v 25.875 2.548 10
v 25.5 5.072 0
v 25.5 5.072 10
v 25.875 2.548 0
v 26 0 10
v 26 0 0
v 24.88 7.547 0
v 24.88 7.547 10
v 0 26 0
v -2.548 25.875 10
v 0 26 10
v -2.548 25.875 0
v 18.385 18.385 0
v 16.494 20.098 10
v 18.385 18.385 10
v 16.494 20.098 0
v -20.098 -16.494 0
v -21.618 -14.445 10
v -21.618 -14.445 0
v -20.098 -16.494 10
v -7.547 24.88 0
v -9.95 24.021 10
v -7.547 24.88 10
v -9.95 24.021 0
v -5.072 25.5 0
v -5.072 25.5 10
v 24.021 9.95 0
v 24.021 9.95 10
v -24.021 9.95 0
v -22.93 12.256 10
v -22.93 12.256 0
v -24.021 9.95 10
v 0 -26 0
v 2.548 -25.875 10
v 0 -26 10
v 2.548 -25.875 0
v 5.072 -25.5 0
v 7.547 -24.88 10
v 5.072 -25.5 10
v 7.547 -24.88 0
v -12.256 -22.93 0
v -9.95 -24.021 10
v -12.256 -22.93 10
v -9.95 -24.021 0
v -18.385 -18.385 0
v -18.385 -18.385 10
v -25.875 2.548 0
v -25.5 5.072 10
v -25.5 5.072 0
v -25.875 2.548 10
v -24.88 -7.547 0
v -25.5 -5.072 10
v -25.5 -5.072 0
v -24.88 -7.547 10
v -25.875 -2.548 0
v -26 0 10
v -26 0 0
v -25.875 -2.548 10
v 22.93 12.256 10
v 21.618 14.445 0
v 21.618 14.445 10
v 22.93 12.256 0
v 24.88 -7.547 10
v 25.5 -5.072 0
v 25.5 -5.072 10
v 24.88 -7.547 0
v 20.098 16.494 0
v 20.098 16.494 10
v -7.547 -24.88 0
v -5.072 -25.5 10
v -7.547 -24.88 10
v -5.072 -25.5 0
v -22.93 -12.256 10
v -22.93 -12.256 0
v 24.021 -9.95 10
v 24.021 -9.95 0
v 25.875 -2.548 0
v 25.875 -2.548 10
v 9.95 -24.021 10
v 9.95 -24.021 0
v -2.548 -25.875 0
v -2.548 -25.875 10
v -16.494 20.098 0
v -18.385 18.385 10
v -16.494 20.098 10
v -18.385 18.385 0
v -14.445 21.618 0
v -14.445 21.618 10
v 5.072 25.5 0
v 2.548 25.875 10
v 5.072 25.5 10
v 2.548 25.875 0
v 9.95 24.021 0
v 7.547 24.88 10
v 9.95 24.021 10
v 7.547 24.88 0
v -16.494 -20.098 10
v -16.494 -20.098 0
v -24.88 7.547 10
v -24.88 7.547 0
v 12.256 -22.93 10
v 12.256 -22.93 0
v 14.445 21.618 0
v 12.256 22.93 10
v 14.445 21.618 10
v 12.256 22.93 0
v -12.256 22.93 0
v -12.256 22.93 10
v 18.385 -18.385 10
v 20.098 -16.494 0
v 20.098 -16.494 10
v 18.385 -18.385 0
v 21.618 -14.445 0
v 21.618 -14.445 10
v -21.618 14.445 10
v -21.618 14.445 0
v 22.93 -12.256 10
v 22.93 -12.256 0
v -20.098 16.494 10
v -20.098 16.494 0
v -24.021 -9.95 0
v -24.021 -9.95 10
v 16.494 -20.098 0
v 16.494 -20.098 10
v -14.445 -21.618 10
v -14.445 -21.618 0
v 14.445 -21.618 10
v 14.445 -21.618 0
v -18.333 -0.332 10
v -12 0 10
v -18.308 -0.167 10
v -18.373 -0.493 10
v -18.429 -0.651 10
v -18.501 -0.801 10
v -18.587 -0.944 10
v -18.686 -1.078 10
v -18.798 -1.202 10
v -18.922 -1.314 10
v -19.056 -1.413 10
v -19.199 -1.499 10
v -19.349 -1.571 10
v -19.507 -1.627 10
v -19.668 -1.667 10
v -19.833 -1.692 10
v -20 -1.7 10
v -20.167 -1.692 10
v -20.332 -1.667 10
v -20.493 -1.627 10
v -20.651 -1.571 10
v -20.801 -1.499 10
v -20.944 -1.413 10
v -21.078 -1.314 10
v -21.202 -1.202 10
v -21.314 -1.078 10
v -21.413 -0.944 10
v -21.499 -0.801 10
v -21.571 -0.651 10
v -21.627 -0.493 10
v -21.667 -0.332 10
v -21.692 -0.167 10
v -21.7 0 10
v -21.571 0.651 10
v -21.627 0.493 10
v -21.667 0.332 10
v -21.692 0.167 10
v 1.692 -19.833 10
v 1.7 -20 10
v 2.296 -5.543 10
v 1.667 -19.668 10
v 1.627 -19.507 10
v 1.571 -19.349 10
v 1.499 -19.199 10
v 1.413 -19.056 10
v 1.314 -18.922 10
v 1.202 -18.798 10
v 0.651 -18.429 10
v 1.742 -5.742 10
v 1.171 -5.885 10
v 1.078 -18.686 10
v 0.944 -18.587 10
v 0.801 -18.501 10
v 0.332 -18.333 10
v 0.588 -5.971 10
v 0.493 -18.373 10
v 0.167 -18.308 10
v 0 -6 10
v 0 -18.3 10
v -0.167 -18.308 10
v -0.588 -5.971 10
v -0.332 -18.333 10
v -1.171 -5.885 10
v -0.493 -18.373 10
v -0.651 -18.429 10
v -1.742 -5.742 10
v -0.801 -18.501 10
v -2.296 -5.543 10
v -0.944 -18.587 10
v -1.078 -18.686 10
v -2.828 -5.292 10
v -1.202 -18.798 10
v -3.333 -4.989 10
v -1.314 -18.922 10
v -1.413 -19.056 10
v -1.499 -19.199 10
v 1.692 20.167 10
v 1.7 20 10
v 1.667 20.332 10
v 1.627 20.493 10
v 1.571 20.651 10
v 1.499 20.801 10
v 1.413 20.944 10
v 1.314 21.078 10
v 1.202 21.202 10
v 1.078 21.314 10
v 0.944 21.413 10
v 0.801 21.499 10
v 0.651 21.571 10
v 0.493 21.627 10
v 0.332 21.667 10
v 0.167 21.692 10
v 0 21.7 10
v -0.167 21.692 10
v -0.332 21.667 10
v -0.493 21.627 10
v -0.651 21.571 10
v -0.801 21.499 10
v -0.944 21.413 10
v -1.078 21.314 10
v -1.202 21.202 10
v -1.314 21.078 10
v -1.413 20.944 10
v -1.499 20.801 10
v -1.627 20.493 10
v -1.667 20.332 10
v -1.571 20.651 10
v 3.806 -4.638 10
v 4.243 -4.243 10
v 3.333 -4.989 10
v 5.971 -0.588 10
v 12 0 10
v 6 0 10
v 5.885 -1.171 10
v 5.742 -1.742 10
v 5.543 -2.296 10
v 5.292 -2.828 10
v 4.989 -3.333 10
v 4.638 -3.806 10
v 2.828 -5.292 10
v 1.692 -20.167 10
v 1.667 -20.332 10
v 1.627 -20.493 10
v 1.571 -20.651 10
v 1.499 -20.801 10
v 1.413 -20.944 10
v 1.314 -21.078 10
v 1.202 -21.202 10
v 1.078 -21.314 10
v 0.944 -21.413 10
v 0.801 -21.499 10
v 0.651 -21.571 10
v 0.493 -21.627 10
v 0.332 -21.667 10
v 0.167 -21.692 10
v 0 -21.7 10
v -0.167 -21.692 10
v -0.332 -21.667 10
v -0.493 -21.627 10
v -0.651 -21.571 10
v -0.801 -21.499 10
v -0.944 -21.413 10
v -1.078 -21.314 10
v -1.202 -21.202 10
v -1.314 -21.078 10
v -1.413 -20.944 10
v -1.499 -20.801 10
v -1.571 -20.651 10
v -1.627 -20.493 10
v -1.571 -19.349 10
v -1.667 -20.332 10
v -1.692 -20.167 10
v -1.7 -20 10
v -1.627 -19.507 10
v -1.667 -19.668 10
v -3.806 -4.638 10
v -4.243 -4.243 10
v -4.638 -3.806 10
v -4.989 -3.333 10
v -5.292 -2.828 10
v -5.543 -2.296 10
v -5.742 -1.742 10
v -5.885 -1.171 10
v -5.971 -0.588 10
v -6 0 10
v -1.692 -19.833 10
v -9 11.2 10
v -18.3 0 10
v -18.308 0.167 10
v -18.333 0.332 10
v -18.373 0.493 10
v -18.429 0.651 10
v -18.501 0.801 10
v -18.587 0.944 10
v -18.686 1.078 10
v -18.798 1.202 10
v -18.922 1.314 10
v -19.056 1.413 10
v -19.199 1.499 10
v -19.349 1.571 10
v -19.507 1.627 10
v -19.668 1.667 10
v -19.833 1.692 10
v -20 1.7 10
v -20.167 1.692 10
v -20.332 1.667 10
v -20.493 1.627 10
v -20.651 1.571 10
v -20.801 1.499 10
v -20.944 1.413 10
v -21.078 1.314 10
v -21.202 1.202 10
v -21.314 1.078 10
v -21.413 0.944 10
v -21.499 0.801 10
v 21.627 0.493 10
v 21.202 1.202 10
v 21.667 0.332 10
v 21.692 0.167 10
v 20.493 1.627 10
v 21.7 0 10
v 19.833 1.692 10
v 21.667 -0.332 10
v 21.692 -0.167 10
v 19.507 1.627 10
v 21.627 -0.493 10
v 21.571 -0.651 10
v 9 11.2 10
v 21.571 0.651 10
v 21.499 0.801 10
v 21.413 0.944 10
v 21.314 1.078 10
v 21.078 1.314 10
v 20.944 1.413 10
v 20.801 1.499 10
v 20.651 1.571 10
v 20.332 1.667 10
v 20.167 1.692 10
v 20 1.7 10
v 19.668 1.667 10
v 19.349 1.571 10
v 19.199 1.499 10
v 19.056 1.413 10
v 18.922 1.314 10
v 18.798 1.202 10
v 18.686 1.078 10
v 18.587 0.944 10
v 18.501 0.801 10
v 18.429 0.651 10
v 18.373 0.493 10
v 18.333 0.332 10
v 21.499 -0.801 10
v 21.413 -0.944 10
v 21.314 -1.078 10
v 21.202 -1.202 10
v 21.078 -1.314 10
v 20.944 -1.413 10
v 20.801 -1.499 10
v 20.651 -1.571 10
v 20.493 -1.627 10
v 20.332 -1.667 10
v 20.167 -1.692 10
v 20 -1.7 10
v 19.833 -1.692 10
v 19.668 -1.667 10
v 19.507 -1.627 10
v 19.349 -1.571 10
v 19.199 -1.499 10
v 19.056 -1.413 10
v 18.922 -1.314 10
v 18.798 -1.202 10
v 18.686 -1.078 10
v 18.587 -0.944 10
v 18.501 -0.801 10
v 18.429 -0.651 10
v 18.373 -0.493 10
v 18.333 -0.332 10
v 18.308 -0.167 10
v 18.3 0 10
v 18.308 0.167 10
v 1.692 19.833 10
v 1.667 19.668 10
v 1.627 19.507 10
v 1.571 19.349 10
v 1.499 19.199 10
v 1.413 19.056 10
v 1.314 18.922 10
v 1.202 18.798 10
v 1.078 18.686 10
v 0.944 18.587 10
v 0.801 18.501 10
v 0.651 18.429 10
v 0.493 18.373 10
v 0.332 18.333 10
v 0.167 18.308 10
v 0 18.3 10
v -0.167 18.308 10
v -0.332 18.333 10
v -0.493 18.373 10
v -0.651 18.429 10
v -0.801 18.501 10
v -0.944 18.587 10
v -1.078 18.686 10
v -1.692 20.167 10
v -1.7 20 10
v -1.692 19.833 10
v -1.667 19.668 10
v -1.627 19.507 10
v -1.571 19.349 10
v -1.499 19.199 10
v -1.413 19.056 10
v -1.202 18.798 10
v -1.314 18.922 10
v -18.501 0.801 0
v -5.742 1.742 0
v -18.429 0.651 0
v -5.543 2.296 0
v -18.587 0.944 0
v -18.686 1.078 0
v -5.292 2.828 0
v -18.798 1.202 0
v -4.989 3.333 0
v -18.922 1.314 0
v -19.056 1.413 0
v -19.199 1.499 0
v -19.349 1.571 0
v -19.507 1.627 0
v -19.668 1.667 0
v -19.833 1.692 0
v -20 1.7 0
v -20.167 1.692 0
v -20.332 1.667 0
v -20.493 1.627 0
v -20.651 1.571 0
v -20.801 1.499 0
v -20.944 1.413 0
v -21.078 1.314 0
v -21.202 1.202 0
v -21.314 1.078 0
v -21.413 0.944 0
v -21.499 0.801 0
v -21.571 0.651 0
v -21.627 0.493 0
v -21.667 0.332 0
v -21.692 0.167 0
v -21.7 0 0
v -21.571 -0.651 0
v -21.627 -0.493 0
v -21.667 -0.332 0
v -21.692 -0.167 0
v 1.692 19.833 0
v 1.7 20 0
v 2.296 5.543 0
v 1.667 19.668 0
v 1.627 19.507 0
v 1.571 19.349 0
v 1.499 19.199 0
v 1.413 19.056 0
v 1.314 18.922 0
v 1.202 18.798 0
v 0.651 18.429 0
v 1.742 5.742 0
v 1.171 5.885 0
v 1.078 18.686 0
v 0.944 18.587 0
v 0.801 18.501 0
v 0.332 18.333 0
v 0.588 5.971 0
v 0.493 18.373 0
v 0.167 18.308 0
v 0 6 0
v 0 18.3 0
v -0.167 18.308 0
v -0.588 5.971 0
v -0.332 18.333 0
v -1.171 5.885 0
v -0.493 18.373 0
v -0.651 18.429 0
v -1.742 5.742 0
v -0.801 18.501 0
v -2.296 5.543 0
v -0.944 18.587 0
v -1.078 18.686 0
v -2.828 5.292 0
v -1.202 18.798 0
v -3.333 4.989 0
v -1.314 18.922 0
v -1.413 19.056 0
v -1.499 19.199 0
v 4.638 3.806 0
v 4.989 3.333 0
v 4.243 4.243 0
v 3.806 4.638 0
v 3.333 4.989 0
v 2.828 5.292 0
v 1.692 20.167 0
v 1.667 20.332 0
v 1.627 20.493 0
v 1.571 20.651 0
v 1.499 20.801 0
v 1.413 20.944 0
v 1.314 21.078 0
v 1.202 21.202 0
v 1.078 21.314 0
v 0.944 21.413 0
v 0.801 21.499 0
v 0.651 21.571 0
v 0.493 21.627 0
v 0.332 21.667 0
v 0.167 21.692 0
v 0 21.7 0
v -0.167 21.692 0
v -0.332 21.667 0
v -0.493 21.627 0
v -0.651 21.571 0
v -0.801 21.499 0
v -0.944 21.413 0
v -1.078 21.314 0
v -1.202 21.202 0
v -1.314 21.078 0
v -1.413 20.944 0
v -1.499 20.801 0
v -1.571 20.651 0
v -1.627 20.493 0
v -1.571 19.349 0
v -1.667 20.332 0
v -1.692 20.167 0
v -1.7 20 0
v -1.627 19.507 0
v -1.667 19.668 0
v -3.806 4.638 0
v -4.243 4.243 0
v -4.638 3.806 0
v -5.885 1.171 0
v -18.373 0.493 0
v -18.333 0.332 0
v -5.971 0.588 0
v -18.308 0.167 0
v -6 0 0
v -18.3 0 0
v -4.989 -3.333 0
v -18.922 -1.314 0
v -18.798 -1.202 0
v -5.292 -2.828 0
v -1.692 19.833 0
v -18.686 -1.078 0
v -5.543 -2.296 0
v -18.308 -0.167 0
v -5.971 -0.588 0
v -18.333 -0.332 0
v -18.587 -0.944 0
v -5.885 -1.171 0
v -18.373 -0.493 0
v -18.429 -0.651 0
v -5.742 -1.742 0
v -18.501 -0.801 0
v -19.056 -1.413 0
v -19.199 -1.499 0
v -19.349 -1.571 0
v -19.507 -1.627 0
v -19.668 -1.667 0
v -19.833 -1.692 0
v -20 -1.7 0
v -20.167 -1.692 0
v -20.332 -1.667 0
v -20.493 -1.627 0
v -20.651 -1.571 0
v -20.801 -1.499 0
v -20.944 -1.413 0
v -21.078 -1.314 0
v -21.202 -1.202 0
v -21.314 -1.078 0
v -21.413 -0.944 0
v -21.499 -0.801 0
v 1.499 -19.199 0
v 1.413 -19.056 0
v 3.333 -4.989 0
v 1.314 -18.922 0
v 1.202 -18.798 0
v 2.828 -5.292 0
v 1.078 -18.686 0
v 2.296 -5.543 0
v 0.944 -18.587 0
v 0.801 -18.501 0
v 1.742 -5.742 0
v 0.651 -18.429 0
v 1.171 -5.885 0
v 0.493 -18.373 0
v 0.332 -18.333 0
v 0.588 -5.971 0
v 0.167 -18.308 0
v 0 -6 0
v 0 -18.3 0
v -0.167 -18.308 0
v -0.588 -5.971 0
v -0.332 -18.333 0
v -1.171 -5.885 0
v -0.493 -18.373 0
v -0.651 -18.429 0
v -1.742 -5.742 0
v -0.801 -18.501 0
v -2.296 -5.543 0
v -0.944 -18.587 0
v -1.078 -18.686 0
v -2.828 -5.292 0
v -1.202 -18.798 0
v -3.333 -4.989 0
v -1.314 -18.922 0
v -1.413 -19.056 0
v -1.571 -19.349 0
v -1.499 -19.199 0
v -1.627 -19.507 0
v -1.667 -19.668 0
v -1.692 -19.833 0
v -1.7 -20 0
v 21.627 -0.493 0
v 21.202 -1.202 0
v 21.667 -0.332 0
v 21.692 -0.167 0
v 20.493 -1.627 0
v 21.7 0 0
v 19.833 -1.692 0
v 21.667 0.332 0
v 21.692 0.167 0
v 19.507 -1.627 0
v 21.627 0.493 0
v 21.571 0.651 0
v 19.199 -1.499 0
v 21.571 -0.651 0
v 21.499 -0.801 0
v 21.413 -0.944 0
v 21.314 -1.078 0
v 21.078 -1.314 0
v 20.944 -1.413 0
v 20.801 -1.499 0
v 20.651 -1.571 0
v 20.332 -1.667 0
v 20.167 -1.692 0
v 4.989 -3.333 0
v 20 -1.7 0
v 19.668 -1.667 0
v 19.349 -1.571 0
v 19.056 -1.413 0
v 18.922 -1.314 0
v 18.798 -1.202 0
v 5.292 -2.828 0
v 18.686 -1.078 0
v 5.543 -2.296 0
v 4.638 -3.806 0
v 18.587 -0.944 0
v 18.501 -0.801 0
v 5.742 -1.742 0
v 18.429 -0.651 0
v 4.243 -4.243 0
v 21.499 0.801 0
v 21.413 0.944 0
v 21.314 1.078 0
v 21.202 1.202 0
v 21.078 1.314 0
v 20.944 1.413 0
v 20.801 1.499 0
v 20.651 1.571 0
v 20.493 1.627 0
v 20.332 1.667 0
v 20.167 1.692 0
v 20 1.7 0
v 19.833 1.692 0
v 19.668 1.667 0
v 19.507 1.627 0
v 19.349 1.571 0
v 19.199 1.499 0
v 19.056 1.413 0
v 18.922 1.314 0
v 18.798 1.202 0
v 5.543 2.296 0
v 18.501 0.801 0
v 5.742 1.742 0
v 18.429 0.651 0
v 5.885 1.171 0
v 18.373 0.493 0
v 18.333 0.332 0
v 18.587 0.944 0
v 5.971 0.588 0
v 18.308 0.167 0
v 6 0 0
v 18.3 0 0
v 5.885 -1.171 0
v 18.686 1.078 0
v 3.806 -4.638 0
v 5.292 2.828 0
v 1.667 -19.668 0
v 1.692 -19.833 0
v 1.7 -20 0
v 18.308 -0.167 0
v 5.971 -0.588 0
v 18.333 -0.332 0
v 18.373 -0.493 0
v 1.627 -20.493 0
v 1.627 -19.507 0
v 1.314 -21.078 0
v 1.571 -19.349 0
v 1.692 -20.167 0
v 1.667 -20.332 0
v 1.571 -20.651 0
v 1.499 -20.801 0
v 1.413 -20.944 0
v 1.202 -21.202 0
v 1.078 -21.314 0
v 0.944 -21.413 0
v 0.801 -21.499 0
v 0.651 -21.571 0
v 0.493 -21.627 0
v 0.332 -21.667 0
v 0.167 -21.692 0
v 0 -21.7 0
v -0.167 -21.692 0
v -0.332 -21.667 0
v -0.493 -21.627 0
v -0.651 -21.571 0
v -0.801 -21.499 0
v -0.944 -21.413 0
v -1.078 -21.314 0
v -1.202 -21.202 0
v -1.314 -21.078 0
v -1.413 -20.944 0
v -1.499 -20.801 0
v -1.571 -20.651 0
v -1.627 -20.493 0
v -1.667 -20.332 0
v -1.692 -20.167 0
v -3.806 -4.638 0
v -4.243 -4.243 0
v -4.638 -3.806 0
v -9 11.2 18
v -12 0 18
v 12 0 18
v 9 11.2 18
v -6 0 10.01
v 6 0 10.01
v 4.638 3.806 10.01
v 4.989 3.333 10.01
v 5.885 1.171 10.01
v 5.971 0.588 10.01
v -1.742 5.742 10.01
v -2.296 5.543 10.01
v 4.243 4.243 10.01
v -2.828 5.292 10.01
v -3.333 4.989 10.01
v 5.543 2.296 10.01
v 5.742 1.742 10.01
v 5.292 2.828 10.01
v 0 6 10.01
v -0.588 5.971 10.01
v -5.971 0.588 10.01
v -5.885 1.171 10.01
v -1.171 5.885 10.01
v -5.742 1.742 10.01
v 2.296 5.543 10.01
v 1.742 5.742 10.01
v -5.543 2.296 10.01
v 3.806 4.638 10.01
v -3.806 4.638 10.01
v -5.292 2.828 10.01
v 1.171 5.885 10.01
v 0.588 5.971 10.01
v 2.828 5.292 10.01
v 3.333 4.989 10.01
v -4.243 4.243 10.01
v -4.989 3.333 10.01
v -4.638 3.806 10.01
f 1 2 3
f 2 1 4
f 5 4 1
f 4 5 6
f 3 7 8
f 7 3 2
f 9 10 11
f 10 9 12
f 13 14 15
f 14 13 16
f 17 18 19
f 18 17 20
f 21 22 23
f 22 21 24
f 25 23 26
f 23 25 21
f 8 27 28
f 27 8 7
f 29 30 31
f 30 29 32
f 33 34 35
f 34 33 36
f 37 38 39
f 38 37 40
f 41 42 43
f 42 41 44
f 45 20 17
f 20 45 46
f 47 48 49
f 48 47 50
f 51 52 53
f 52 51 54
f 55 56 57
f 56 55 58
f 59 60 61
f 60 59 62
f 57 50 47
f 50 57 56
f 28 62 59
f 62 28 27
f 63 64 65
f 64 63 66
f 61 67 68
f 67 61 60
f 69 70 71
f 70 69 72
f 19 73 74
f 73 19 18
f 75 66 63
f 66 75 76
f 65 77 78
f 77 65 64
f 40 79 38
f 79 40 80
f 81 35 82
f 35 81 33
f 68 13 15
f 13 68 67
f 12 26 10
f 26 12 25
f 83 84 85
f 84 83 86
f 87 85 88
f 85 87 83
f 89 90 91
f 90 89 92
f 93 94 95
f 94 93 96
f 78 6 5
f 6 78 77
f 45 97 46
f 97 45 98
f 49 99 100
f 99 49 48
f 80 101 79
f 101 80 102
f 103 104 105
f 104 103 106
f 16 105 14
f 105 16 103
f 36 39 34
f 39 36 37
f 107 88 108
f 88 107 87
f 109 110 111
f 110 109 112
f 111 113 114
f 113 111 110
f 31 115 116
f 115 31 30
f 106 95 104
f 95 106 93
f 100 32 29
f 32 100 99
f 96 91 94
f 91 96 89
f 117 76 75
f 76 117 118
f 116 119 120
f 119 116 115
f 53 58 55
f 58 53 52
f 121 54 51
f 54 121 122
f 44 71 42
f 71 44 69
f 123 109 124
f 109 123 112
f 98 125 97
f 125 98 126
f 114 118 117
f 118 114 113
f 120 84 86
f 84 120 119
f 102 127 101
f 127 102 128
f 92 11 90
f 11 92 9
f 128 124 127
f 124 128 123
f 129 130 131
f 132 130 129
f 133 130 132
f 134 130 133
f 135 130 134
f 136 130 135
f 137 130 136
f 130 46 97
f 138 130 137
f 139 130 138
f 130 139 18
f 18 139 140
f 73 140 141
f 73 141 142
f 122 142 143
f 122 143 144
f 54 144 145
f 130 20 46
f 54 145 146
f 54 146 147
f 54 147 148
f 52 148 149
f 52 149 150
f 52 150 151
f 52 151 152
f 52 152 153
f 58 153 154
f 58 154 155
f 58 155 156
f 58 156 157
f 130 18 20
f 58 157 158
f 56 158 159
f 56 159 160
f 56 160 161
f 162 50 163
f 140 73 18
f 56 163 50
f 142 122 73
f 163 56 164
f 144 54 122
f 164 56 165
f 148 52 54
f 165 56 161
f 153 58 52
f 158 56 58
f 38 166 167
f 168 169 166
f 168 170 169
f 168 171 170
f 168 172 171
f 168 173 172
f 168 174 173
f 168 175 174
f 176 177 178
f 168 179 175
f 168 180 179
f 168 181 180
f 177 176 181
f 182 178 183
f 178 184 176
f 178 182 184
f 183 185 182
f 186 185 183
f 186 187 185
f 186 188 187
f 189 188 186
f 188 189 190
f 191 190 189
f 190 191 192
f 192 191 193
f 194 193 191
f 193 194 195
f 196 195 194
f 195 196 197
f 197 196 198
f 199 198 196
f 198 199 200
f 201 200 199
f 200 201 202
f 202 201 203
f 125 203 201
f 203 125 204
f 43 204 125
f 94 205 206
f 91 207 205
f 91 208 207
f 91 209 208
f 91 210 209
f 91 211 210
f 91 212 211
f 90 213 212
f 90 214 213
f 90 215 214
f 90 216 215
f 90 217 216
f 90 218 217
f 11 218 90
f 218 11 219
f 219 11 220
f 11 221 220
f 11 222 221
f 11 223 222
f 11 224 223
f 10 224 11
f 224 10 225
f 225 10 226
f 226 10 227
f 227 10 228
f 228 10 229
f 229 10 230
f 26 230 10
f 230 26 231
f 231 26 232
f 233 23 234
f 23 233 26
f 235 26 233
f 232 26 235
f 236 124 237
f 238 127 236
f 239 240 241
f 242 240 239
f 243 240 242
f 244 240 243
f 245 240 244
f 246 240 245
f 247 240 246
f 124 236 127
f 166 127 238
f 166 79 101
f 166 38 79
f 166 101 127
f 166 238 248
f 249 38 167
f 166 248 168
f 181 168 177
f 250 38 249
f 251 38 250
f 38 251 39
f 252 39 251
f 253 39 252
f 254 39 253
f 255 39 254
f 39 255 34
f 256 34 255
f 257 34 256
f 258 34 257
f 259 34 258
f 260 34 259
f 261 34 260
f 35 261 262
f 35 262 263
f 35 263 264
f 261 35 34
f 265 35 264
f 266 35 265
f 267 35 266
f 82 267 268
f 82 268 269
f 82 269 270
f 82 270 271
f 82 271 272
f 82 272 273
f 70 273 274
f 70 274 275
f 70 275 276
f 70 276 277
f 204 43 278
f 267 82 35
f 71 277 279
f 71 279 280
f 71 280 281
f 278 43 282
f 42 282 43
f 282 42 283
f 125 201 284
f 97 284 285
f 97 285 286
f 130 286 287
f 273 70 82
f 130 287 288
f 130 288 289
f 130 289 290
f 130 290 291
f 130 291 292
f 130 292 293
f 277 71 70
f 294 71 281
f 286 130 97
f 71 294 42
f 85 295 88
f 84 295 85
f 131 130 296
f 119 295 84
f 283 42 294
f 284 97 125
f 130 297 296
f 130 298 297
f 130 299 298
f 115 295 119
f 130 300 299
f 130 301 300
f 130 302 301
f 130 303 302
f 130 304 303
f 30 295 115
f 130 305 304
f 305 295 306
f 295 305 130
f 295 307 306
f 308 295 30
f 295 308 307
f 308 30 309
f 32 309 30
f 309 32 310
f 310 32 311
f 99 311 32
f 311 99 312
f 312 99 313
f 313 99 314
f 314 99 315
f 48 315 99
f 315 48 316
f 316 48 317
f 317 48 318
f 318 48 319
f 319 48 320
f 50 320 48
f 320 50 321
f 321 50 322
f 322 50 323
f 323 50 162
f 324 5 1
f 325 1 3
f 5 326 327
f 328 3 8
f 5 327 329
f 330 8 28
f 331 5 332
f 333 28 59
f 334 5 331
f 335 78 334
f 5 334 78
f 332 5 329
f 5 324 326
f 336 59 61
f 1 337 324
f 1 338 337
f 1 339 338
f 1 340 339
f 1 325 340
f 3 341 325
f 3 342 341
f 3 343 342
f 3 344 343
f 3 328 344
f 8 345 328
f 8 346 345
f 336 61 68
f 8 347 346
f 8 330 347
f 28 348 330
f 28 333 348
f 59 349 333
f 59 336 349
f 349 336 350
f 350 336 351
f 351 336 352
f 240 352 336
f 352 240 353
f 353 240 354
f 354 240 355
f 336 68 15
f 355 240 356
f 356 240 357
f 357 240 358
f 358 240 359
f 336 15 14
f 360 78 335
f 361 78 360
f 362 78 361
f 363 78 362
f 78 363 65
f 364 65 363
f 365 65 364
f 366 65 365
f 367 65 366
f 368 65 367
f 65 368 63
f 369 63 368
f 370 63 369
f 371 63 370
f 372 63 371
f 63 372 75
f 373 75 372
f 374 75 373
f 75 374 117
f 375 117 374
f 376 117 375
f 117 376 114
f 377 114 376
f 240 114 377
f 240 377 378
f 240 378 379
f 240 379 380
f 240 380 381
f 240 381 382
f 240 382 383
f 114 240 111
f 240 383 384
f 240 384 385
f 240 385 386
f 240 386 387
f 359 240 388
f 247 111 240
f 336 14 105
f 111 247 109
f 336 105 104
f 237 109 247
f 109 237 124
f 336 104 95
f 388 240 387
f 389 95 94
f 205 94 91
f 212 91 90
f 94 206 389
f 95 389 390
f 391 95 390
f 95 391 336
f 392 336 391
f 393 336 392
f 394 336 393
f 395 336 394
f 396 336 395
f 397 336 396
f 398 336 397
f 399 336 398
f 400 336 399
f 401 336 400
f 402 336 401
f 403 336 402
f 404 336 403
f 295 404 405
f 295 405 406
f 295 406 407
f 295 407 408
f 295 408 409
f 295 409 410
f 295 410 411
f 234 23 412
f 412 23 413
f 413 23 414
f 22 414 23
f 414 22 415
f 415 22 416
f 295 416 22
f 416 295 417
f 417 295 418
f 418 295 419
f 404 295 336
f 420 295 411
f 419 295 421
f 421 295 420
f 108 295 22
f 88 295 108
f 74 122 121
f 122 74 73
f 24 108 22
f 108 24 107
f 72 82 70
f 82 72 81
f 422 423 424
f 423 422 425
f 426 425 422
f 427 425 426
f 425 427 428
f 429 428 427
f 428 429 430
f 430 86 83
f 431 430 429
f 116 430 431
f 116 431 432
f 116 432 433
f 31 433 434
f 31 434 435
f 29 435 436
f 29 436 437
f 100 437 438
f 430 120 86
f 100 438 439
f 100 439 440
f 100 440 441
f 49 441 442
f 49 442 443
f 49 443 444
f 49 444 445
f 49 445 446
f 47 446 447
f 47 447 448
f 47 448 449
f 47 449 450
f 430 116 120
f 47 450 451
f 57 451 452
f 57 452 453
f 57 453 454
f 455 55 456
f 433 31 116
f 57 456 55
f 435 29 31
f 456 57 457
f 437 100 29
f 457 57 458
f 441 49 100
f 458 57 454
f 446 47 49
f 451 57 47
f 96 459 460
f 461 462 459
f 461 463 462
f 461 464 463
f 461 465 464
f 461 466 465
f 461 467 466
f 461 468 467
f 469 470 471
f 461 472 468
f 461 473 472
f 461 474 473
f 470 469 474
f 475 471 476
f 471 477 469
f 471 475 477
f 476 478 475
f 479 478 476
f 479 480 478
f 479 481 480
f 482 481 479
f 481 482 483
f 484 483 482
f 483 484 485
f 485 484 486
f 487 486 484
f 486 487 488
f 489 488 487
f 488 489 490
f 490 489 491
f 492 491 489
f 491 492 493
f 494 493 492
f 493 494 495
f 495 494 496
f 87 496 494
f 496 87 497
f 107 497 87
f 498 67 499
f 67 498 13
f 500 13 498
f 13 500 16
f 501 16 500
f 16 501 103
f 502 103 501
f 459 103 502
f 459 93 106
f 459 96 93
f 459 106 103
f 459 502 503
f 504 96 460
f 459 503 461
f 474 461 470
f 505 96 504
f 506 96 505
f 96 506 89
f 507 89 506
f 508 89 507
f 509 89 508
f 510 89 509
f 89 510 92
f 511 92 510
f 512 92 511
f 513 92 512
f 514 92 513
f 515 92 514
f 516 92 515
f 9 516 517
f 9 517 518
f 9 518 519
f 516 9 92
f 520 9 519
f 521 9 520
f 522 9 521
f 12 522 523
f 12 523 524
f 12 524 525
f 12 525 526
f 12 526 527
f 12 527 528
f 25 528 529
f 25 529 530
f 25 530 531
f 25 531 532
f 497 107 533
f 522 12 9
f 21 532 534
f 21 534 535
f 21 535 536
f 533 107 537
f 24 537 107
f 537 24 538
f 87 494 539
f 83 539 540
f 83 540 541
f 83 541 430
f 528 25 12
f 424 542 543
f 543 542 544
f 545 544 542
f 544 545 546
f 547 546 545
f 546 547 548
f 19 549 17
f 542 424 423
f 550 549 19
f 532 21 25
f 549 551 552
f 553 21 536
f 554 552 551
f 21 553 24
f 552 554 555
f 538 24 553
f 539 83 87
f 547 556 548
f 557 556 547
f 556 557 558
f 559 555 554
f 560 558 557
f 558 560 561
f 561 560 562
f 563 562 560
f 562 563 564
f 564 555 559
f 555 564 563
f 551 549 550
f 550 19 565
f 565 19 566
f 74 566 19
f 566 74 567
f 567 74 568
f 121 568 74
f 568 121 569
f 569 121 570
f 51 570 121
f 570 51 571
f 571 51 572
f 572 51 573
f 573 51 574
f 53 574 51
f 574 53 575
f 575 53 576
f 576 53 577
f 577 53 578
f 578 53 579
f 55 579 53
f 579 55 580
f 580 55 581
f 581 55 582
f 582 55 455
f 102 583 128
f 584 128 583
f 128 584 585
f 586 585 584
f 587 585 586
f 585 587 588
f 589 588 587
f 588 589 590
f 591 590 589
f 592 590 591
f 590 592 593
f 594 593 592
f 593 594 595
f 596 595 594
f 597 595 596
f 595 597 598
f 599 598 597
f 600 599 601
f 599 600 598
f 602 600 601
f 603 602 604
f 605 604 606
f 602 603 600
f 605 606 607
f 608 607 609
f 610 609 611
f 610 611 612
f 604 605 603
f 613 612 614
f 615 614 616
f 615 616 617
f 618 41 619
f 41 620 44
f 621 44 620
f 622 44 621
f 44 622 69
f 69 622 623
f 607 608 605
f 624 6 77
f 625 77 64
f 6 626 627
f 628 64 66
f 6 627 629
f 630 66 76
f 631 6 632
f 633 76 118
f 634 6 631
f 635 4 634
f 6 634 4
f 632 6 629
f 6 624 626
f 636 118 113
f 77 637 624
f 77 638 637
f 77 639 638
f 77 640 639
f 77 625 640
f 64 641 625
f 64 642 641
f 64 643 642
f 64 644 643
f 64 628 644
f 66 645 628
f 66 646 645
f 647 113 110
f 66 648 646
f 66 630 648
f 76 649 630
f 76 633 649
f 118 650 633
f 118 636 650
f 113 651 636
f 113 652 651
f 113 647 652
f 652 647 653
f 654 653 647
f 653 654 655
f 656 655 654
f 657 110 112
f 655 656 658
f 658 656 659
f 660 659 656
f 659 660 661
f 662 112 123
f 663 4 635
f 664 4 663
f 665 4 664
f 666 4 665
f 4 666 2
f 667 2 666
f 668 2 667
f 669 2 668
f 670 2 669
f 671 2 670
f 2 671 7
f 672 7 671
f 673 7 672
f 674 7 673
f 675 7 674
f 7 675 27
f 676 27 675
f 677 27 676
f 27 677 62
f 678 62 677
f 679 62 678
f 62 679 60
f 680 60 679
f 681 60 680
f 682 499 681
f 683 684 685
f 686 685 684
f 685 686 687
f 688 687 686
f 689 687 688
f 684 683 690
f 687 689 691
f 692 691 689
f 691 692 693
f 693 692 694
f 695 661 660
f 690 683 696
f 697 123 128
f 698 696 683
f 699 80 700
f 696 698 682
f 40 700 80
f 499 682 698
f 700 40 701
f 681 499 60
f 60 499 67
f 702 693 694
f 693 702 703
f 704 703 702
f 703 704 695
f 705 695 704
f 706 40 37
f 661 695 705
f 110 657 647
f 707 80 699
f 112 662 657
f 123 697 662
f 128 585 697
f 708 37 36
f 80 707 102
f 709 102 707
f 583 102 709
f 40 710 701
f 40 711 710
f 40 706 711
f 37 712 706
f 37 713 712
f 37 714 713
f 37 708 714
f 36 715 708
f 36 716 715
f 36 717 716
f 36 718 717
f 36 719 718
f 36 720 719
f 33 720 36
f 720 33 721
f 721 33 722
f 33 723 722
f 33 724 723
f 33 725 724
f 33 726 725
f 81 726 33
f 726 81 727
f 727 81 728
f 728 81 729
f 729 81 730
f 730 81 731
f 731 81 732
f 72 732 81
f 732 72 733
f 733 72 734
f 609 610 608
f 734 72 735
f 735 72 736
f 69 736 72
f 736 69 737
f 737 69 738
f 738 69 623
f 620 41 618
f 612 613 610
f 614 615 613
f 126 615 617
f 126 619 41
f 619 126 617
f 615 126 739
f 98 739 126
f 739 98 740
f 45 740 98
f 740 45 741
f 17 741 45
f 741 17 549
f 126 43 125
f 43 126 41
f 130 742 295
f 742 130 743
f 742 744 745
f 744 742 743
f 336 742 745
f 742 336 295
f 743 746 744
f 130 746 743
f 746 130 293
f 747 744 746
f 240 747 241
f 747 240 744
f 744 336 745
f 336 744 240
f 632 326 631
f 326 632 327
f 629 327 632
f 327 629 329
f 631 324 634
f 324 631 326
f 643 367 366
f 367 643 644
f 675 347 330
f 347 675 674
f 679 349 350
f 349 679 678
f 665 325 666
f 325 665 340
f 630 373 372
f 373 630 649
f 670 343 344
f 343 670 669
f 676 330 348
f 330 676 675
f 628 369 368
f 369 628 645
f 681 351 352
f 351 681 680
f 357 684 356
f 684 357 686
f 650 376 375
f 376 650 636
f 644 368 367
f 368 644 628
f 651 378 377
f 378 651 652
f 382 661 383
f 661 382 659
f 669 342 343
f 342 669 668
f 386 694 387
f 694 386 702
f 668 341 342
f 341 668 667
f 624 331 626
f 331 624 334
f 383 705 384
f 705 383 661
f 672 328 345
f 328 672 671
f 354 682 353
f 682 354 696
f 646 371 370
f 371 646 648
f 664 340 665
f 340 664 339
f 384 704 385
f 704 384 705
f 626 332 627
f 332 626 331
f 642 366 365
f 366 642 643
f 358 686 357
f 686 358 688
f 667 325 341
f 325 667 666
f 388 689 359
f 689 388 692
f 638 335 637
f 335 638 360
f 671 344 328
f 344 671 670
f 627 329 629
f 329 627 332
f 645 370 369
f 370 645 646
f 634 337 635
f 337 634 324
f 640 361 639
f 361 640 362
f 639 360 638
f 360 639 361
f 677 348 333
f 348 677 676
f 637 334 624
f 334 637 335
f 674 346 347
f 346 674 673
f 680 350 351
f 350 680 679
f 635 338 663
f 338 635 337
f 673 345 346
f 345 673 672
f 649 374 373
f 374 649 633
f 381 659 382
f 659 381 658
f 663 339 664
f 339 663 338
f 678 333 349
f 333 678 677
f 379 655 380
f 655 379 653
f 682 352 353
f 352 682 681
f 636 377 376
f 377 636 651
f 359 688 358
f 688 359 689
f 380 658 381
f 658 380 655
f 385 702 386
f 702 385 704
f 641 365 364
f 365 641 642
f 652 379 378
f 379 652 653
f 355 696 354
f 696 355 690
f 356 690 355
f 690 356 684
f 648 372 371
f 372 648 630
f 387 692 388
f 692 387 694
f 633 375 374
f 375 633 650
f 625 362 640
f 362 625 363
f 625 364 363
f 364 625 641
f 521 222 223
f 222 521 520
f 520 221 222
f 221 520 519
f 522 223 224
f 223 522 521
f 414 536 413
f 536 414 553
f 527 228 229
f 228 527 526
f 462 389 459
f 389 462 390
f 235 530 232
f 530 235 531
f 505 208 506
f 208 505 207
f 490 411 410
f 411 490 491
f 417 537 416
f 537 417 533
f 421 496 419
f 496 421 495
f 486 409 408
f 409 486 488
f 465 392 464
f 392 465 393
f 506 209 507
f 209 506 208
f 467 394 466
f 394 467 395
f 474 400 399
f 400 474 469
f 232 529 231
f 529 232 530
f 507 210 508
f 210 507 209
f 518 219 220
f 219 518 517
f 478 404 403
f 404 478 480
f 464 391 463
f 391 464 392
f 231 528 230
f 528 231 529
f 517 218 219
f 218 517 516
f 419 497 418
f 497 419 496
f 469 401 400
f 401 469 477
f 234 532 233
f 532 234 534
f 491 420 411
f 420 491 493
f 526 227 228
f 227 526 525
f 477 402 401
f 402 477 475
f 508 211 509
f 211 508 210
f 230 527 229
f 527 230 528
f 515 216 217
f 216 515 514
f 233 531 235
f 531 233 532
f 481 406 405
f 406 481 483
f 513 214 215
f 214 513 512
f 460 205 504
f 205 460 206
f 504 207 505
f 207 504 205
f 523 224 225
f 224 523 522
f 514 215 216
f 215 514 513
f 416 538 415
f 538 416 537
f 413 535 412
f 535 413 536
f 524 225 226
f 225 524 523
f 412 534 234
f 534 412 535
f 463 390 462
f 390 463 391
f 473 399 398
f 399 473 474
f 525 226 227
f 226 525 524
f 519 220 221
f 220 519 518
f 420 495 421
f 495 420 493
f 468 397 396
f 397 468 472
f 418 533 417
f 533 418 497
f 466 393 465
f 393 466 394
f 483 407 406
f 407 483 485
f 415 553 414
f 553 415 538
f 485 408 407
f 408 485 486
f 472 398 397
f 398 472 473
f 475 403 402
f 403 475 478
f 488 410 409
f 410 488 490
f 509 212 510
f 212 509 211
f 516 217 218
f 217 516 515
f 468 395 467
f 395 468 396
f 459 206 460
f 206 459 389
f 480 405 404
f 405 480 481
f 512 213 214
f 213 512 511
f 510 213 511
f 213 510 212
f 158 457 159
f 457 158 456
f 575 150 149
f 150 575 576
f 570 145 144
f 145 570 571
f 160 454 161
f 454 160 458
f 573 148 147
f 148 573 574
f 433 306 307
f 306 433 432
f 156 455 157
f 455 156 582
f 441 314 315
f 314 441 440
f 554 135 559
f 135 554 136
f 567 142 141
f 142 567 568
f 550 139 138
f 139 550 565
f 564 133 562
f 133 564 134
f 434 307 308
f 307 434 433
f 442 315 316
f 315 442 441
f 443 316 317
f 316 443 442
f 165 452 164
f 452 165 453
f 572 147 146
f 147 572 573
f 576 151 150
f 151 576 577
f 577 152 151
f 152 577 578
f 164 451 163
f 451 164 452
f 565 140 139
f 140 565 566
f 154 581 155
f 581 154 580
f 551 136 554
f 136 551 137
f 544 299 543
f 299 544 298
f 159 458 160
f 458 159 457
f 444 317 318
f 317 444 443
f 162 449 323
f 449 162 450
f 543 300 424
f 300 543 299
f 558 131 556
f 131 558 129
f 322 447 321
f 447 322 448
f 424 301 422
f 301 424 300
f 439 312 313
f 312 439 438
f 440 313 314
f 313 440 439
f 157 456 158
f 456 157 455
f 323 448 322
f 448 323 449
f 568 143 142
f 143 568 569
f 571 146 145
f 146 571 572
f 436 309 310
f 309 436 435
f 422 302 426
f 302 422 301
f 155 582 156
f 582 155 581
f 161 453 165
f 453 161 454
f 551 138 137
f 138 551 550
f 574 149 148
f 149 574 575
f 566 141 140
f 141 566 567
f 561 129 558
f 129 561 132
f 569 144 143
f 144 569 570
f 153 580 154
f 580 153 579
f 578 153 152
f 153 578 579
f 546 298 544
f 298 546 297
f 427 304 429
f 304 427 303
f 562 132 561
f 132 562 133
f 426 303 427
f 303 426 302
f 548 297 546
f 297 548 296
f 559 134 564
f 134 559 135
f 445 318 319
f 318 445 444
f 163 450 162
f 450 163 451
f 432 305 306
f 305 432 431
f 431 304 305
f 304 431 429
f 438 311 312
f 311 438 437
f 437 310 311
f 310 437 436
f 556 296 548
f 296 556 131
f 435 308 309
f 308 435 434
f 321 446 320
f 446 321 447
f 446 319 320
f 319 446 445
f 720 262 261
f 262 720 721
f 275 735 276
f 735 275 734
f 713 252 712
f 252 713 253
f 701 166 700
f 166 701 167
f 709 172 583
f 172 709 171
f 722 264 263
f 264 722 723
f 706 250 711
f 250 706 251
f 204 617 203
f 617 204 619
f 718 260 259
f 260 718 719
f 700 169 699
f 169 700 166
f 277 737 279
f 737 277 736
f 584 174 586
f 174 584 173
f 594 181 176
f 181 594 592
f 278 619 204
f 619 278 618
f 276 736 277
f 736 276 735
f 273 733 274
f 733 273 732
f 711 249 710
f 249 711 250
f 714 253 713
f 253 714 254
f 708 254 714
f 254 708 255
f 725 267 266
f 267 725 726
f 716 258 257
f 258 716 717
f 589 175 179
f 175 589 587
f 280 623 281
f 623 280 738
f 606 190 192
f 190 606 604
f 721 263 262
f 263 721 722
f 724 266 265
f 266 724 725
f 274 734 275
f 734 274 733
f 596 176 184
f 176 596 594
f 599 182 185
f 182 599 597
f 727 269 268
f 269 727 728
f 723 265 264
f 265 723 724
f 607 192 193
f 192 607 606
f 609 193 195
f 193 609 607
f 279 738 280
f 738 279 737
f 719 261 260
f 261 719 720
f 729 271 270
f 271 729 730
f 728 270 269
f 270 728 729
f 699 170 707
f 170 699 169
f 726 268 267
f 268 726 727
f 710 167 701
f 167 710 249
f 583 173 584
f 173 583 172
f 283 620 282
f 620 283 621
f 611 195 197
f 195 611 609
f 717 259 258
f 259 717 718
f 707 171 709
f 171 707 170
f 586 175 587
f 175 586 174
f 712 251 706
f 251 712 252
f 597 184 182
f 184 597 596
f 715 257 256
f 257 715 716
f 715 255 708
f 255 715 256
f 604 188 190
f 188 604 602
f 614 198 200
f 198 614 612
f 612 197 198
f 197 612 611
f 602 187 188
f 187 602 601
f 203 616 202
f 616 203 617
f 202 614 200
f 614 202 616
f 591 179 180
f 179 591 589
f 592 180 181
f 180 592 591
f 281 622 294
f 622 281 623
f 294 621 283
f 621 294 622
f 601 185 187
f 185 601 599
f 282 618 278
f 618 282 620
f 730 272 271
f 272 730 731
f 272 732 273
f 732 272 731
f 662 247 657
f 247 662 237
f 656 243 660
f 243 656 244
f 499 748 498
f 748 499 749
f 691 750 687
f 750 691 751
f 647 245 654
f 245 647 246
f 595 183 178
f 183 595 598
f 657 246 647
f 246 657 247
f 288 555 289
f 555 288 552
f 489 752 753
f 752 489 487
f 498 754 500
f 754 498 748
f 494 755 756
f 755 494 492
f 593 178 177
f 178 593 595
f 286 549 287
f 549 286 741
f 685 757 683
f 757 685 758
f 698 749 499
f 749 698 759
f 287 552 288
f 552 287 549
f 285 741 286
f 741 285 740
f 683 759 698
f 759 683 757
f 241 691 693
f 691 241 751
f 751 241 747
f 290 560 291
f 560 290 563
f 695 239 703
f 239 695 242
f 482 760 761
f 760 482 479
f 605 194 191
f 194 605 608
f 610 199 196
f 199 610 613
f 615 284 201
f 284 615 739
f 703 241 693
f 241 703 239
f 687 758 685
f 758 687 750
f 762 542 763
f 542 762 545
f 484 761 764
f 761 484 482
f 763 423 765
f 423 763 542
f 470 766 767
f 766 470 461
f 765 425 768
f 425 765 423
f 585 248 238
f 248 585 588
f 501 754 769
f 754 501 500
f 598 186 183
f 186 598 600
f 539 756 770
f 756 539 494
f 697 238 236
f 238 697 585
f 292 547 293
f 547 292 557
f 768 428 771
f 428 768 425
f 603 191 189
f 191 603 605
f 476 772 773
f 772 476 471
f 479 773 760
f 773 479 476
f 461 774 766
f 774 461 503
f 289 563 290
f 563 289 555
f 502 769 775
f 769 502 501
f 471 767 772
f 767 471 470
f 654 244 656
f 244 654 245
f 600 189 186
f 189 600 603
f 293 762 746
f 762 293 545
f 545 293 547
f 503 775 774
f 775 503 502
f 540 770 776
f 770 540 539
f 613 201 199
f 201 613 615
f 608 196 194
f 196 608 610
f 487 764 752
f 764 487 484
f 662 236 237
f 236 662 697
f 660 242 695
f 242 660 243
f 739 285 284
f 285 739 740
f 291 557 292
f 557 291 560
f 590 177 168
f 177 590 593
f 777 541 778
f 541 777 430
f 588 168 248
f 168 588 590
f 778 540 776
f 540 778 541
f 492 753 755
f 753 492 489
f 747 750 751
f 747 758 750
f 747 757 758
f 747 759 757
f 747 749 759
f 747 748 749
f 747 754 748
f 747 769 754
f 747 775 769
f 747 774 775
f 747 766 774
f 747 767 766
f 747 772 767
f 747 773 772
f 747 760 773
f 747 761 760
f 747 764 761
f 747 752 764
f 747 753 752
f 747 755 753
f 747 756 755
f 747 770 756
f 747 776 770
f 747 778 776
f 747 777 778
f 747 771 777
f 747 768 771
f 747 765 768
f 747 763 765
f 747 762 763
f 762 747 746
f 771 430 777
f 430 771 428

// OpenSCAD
// ============================================================
// Wrist / socket interface — connects the palm chassis to a
// residual-limb socket. Two parts:
//   1. wrist_adapter  — bolts to the palm (shared bolt circle),
//                       provides a quick-release dovetail + wire pass.
//   2. socket_cuff    — parametric forearm cuff (scale to a scan or
//                       to two circumference measurements).
//
// v1 is a passive rigid wrist. A compliant wrist (TPU disc between
// the two bolt circles) is a drop-in upgrade — see note at bottom.
//
// PRINT: PETG. Cuff can be TPU 95A for a compliant, comfortable fit.
// ============================================================

/* [Shared with palm_chassis.scad] */
wrist_bolt_circle = 40; wrist_bolt_d = 3.4; wrist_bolt_n = 4;

/* [Adapter] */
adapter_d = 52; adapter_t = 10;
wire_pass_d = 12;
dovetail_w = 24; dovetail_h = 8; dovetail_taper = 3;

/* [Socket cuff] — measure the residual limb */
forearm_prox_circ = 240;   // mm circumference near elbow
forearm_dist_circ = 180;   // mm circumference near wrist
cuff_len = 120;
cuff_wall = 3;
strap_slot_w = 25; strap_slot_h = 4;

$fn = 64;
EPS = 0.01;
function circ_to_r(c) = c / (2 * PI);

module bolt_circle(h) {
    for (i = [0:wrist_bolt_n - 1])
        rotate([0, 0, i * 360/wrist_bolt_n])
            translate([wrist_bolt_circle/2, 0, -EPS])
                cylinder(d = wrist_bolt_d, h = h + 2*EPS);
}

module wrist_adapter() {
    difference() {
        union() {
            cylinder(d = adapter_d, h = adapter_t);
            // male dovetail on top (mates socket_cuff's female slot)
            translate([0, 0, adapter_t])
                linear_extrude(dovetail_h)
                    polygon([[-dovetail_w/2, 0], [dovetail_w/2, 0],
                             [dovetail_w/2 - dovetail_taper, dovetail_h*1.4],
                             [-dovetail_w/2 + dovetail_taper, dovetail_h*1.4]]);
        }
        bolt_circle(adapter_t);
        translate([0, 0, -EPS]) cylinder(d = wire_pass_d, h = adapter_t + 2*EPS);
    }
}

module socket_cuff() {
    rp = circ_to_r(forearm_prox_circ);
    rd = circ_to_r(forearm_dist_circ);
    difference() {
        // tapered tube shell
        difference() {
            cylinder(r1 = rd + cuff_wall, r2 = rp + cuff_wall, h = cuff_len);
            translate([0, 0, -EPS])
                cylinder(r1 = rd, r2 = rp, h = cuff_len + 2*EPS);
        }
        // open the volar side ~140 deg so the limb slides in
        translate([0, 0, -EPS])
            rotate([0, 0, -70])
                linear_extrude(cuff_len + 2*EPS)
                    polygon([[0,0], [rp*2, 0],
                             [rp*2*cos(140), rp*2*sin(140)]]);
        // strap slots (two pairs)
        for (z = [cuff_len*0.25, cuff_len*0.7], a = [30, 150])
            rotate([0, 0, a])
                translate([rd, 0, z])
                    rotate([0, 90, 0])
                        cube([strap_slot_h, strap_slot_w, 12], center = true);
        // female dovetail at the distal end (mates wrist_adapter)
        translate([0, 0, -EPS])
            linear_extrude(dovetail_h + 1)
                polygon([[-dovetail_w/2 - 0.3, 0], [dovetail_w/2 + 0.3, 0],
                         [dovetail_w/2 - dovetail_taper + 0.3, dovetail_h*1.4],
                         [-dovetail_w/2 + dovetail_taper - 0.3, dovetail_h*1.4]]);
    }
}

// ---- render selection ----
part = "adapter"; // "adapter" | "cuff"
if (part == "adapter") wrist_adapter();
else translate([80, 0, 0]) socket_cuff();

// Compliant-wrist upgrade: print a 6 mm TPU 95A disc with the same
// bolt circle and sandwich it between wrist_adapter and palm_chassis
// for a shock-absorbing, slightly flexible wrist.
